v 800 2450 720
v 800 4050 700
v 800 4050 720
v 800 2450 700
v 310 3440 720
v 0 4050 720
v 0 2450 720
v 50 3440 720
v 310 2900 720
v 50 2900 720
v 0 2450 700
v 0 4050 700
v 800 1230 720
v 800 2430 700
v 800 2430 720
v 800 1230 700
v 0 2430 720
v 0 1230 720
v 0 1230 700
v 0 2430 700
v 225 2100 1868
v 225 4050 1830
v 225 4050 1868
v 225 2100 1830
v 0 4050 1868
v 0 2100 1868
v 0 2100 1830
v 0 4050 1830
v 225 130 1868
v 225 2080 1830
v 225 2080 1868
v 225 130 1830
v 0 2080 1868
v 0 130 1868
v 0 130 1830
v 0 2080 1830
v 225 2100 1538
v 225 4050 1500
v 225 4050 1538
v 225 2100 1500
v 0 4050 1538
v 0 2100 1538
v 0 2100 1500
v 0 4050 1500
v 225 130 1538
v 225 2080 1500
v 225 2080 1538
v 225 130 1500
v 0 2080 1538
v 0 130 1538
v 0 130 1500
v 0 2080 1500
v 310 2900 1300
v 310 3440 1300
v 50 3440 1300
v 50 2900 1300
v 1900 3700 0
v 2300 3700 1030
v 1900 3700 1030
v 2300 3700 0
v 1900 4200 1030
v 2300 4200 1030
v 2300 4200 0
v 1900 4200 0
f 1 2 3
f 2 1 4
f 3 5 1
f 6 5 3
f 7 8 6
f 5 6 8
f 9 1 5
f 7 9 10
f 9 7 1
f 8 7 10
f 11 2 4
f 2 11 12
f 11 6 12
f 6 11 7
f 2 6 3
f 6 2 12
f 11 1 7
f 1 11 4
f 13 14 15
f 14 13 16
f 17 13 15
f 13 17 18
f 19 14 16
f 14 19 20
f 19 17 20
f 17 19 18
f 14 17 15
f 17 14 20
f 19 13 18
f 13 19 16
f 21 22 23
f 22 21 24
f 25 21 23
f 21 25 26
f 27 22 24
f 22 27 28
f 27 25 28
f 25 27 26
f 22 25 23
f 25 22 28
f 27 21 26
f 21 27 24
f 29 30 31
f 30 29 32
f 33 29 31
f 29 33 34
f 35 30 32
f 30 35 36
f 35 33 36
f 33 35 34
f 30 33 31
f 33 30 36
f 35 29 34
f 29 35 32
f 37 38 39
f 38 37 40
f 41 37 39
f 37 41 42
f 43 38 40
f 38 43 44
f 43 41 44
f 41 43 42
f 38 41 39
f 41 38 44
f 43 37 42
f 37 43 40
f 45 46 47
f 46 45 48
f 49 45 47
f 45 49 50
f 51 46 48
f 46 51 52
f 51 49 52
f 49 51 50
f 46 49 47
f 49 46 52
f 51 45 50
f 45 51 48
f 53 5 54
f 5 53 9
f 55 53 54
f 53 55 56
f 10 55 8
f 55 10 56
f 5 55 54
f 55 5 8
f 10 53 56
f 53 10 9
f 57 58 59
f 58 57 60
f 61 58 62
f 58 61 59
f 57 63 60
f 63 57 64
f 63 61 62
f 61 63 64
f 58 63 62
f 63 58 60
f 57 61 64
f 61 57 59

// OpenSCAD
// file: lib/wardrobe.scad
// Bedroom Wardrobe CAD

// Note: OpenSCAD doesn't support nested use/include.
// The only way I could get it to work is by including every dependency into
// the main CAD file. Sadly, I think this is quite limited. Needs more
// investigaiton.
// include <lib/batten.scad>;
// use <lib/batten.scad>;

// Wardrobe dimensions
function wd_length() = 1733; // Y
function wd_width() = 0819; // X
function wd_height() = 2398; // Z

// Wardrobe colour
function wd_colour() = "white";
function wd_rail_colour() = "silver";

// Skirting dimensions
function wd_skirting_width() = 16;
function wd_skirting_height() = 145;

// Shelf dimensions
// Cut length to size.
function wd_shelf_height() = 18;
function wd_shelf_width() = 500;

// Clothes rail dimensions
function wd_rail_radius() = 15;
function wd_rail_z() = -60;

module wd_skirting_rear() {
	cube([wd_skirting_width(), wd_length(), wd_skirting_height()]);
}

module wd_skirting_side() {
	cube([wd_width(), wd_skirting_width(), wd_skirting_height()]);
}

module wd_wall_with_door() {
	door_length = 1381;
	door_height = 2000;
	wall_with_door(wd_length(), wd_height(), door_length, door_height);
}

// Walls, guidance only 2D shapes
module wd_walls() {
	// base
	square([wd_width(), wd_length()]);
	// rear
	rotate(-90, [0, 1, 0])
		square([wd_height(), wd_length()]);
	// door
	translate([wd_width(), 0, 0])
		rotate(-90, [0, 1, 0])
		wd_wall_with_door();

	wd_skirting_rear();
	wd_skirting_side();
	translate([0, wd_length()-wd_skirting_width(), 0])
		wd_skirting_side();
}

// Clothes rail full length, underneath shelf_height, centred on shelf_width.
module wd_crail_full(shelf_width) {
	// rail ends screw into the battens
	rail_end_radius = 20;
	rail_end_height = 10;
	rail_end_y = [batten_large_width(),
		wd_length()-batten_large_width()-rail_end_height];

	// Height of the pole if it were standing up
	rail_height = wd_length() - batten_large_width() * 2;
	echo(str("clothes rail, cut ", rail_height, "mm"));

	// Positioned half way under shelf_width and suspended z mm
	rail_x = shelf_width / 2;

	// rail
	translate([rail_x, batten_large_width(), wd_rail_z()])
		rotate(-90, [1, 0, 0])
		color(wd_rail_colour())
		cylinder(rail_height, wd_rail_radius(), wd_rail_radius());
	
	// supports
	for (i = rail_end_y) {
		translate([rail_x, i, wd_rail_z()])
			rotate(-90, [1, 0, 0])
			color(wd_rail_colour())
			cylinder(rail_end_height, rail_end_radius,
				rail_end_radius);
	}
}

// Create a full sized shelf
module wd_shelf_full(rail=false) {
	shelf_batten(wd_length());
	if (rail) {
		wd_crail_full(wd_shelf_width());
	}
}

// Wardrobe divider wall
// Set cutout to true to cut out rail, batten, skirting holes
module wd_div_wall(height, cutout=false) {
	echo(str("divider wall, cut to ", height, "mm"));
	if (cutout) {
		difference() {
			color(wd_colour())
				cube([wd_shelf_width(), wd_shelf_height(), height]);
			// Cutout for rail
			// Note: When you build this, drill a nice hole
			c_rail_x = wd_shelf_width() / 2 - wd_rail_radius();
			c_rail_height = abs(wd_rail_z()) + wd_rail_radius();
			translate([c_rail_x, 0, height])
				mirror([0, 0, 1])
				cube([wd_rail_radius() * 2,
					wd_shelf_height(),
					c_rail_height]);
			// batten cutout
			translate([0, 0, height])
				mirror([0, 0, 1])
				cube([batten_large_width(),
					wd_shelf_height(),
					batten_large_length()]);
			// skirting
			cube([wd_skirting_width(),
				wd_shelf_height(),
				wd_skirting_height()]);
		}
	} else {
		cube([wd_shelf_width(), wd_shelf_height(), height]);
	}
}

function wd_shelf_left_length_default() = 
	wd_length() / 2 - wd_shelf_height() / 2;

module wd_shelf_left(length=wd_shelf_left_length_default()) {
	shelf_batten(length, bl=batten_medium_length(), rbatten=false);
}

module wd_shelf_right(length=wd_shelf_left_length_default()) {
	translate([0, wd_length(), 0])
		mirror([0, 1, 0])
			wd_shelf_left(length);
}
// main file
// Office layout with shelves and desks
use <lib/wardrobe.scad>

function office_width() = 2300;
function office_length() = 4200;
function office_door_width() = 450;
function office_door_length() = 1200;
function office_height() = 2370;

module office_walls(show_back_wall=true) {
	// backwall
	rotate([0, -90, 0]) square([office_height(), office_length()]);

	// window wall
	translate([0, office_length(), 0])
		rotate([0, -90, -90])
		square([office_height(), office_width()]);

	// left wall
	rotate([0, -90, -90])
		square([office_height(), office_width() + office_door_width()]);

	if (show_back_wall) {
		// wall with door
		translate([office_width() + office_door_width(), 0, 0])
			rotate([0, -90, 0])
			square([office_height(), office_door_length()]);

		// wall to the right of door
		translate([office_width(), office_door_length(), 0])
			rotate([0, -90, -90])
			square([office_height(), office_door_width()]);

		// back wall
		translate([office_width(), office_door_length(), 0])
			rotate([0, -90, 0])
			square([office_height(), office_length() - office_door_length()]);
	}
}

module desks() {
	elevate = 700;
	width = 800;
	length_t = 1600;
	length_k = 1200;
	spacing_wall = 150;
	spacing_between = 20;

	// Tom's Desk
	translate([0, office_length() - spacing_wall - length_t, elevate])
		cube([width, length_t, 20]);

	// Kat's Desk
	translate([0, office_length() - spacing_wall - length_t - spacing_between - length_k, elevate])
		cube([width, length_k, 20]);
}

module monitor() {
	w = 260;
	l = 540;
	h = 600;

	translate([50, office_length() - 1600 + 300, 700])
		cube([w, l, h]);
}

module kallax() {
	w = 1470;
	h = w;
	d = 400;

	translate([300, d, 0])
		rotate([0, 0, -90])
		cube([d, w, h]);
}

module filing_cabinet_old() {
	w = 500;
	l = 400;
	h = 1030;

	translate([office_width() - l, office_length(), 0])
		rotate([0, 0, -90])
		cube([w, l, h]);
}

module filing_cabinet_new() {
	w = 500;
	l = 400;
	h = 1030;

	translate([0, 0, 0])
		rotate([0, 0, 0])
		cube([w, l, h]);
}

module shelves() {
	// chunky scaffold cut in half
	// https://www.gumtree.com/p/wood-timber/chunky-scaffold-board-/1424909094
	w = 225;
	l = 3900 / 2;
	h = 38;

	// 1.5m shelves
	/* w = 225; */
	/* l = 1500; */
	/* h = 38; */

	elevate_row_bottom = 1500;
	elevate_row_top = elevate_row_bottom + 330;
	spacing_wall = 150;
	spacing_between = 20;

	// top right
	translate([0, office_length() - spacing_wall - l, elevate_row_top])
		cube([w, l, h]);

	// top left
	translate([0, office_length() - spacing_wall - l - spacing_between - l, elevate_row_top])
		cube([w, l, h]);

	// bottom right
	translate([0, office_length() - spacing_wall - l, elevate_row_bottom])
		cube([w, l, h]);

	// bottom left
	translate([0, office_length() - spacing_wall - l - spacing_between - l, elevate_row_bottom])
		cube([w, l, h]);
}

% office_walls(show_back_wall=false);
desks();
monitor();
/* kallax(); */
filing_cabinet_old();
shelves();
